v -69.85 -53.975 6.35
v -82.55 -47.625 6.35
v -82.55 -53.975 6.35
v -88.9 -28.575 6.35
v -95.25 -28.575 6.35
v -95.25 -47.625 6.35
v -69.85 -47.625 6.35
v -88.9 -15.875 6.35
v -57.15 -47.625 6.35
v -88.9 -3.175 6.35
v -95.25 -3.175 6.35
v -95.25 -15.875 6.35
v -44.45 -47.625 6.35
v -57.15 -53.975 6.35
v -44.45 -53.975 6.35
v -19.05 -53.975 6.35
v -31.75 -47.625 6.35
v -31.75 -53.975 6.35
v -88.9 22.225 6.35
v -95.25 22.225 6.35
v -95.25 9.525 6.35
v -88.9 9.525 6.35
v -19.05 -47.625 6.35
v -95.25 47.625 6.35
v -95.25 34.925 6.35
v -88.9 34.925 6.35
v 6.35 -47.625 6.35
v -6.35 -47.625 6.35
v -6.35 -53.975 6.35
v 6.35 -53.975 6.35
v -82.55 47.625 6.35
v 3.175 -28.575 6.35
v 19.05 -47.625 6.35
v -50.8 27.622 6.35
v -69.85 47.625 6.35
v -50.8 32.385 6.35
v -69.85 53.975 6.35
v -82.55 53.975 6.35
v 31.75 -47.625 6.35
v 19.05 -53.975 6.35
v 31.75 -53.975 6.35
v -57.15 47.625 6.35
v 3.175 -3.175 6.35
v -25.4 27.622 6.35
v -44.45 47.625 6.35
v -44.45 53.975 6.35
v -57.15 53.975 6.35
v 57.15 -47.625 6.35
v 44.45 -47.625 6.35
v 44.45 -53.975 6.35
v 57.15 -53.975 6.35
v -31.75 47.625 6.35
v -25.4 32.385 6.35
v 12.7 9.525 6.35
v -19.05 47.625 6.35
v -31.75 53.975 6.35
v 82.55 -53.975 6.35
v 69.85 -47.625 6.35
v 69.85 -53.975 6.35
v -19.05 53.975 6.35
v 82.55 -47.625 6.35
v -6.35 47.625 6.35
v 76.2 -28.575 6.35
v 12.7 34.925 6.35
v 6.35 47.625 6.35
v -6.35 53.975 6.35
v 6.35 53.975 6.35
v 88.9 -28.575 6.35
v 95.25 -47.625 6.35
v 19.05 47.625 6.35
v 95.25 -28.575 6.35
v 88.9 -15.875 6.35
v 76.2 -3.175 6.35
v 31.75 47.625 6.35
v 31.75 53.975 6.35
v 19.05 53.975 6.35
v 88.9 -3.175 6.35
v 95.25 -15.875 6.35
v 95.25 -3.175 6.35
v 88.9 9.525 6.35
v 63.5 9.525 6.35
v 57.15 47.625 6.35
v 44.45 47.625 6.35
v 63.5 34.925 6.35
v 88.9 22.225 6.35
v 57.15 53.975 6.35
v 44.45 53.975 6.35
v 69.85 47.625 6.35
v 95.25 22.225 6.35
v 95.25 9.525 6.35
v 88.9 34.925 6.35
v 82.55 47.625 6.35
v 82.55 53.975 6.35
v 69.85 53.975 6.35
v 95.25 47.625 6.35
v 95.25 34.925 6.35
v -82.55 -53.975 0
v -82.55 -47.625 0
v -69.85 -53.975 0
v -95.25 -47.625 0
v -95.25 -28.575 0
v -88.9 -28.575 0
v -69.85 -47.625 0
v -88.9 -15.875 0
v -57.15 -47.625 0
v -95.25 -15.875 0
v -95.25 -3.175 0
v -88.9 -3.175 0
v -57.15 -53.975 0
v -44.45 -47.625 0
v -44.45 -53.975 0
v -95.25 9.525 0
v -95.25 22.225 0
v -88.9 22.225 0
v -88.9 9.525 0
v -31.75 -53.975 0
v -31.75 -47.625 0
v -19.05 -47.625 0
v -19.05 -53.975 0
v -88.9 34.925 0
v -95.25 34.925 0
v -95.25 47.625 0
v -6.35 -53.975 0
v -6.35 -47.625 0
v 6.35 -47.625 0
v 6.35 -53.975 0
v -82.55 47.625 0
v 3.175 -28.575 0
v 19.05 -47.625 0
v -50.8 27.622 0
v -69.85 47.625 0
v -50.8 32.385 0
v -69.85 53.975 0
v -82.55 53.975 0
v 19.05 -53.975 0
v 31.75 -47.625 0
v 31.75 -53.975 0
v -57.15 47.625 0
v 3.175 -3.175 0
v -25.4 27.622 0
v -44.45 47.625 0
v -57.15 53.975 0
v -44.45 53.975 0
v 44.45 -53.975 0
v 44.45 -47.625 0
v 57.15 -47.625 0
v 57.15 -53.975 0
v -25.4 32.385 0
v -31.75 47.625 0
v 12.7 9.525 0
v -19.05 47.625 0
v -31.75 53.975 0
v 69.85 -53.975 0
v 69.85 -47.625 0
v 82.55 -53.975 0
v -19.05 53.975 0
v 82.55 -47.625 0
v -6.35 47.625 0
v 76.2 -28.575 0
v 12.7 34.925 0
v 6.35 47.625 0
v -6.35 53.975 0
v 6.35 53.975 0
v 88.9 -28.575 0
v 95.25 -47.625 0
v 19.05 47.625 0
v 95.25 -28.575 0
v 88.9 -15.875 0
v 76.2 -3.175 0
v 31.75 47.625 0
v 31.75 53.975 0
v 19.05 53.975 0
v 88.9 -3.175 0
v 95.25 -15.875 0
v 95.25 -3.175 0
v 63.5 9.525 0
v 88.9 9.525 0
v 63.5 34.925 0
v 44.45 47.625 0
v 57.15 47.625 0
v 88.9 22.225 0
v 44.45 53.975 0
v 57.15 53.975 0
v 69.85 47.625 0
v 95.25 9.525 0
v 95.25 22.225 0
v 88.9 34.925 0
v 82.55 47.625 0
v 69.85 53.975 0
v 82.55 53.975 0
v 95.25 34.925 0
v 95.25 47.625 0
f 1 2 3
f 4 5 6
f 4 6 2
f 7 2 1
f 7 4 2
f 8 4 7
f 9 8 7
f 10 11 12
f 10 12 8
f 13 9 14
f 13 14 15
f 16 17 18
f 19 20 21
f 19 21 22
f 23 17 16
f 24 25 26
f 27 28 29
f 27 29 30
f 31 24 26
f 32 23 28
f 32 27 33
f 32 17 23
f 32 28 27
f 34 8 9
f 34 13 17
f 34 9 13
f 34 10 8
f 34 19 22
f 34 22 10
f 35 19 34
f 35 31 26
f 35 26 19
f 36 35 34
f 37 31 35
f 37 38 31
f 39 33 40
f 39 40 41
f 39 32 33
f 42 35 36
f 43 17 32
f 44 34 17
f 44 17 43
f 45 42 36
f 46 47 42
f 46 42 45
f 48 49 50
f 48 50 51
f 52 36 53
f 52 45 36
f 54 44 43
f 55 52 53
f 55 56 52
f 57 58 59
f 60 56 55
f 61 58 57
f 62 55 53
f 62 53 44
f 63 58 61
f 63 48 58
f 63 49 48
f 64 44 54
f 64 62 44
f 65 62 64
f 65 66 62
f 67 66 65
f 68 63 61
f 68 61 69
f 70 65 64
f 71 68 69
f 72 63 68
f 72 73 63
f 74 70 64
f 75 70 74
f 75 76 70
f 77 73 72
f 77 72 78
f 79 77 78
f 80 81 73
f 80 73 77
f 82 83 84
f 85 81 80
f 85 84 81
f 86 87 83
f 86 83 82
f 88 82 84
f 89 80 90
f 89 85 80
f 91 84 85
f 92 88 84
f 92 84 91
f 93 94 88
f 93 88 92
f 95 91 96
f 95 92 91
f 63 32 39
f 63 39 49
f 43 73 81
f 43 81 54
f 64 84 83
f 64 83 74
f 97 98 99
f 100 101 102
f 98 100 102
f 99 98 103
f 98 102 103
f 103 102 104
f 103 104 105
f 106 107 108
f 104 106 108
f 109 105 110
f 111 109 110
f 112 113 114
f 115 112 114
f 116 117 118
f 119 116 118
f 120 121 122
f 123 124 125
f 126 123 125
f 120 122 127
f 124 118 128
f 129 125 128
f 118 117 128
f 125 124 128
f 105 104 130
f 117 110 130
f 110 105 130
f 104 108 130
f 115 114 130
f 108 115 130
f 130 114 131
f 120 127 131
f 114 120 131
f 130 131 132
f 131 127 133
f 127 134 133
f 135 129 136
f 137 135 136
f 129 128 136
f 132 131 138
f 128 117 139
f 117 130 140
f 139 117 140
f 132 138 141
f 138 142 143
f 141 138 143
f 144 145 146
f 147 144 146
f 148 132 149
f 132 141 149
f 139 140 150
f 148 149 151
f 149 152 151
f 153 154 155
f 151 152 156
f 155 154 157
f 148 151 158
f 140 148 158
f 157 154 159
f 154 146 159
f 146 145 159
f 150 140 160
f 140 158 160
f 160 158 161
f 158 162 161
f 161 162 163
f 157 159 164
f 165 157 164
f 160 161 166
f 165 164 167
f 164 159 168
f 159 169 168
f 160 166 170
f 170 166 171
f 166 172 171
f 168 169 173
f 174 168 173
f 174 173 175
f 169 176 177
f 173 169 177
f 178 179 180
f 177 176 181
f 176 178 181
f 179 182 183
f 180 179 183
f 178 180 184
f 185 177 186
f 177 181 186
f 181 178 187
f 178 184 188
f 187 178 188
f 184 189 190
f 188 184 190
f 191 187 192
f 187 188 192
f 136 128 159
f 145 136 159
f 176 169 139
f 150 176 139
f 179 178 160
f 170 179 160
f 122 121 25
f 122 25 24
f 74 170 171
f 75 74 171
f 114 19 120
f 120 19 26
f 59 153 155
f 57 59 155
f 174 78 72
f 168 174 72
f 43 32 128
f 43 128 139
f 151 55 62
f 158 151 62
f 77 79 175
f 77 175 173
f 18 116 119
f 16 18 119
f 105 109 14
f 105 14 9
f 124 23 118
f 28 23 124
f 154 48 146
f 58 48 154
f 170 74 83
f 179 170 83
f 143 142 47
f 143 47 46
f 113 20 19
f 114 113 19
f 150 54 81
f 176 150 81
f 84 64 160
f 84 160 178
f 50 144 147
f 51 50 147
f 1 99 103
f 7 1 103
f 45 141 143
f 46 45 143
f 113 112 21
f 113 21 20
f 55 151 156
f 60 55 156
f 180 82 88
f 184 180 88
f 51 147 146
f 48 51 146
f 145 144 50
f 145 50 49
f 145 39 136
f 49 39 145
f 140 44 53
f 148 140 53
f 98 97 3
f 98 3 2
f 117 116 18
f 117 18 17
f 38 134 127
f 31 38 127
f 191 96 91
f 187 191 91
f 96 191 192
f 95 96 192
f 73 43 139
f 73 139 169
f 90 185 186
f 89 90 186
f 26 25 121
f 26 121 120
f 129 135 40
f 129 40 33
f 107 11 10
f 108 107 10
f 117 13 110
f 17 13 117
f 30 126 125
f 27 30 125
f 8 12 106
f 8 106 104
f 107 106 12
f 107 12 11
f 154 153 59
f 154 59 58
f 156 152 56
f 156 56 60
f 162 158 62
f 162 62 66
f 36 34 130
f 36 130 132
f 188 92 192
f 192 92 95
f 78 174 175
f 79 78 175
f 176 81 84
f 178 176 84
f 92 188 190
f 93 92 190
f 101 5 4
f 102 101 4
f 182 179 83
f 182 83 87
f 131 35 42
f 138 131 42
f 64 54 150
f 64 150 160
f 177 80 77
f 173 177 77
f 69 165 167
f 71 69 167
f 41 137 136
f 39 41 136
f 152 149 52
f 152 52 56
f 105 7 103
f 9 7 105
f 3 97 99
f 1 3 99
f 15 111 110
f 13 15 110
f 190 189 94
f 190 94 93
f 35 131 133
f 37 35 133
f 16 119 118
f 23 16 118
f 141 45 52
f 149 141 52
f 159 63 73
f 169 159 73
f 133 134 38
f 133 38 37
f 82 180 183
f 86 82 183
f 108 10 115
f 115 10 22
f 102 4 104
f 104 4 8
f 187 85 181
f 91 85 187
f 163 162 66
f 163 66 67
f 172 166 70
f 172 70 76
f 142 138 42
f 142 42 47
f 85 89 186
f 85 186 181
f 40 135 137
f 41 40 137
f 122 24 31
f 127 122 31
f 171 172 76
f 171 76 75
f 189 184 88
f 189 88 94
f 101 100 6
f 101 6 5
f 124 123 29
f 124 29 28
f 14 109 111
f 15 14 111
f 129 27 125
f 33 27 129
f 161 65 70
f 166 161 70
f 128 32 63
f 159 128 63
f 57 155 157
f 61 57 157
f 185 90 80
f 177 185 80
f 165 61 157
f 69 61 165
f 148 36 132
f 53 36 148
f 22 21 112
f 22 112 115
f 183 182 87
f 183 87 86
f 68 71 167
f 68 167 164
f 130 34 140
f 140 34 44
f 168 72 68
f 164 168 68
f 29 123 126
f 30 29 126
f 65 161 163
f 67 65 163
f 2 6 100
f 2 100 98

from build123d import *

# Parameters (mm, degrees)
SKETCH1_W               = 190.5
SKETCH1_H               = 107.95
BOSS_EXTRUDE1_DEPTH     = 6.35
SKETCH2_W               = 12.7
SKETCH2_H               = 6.35
CUT_EXTRUDE1_DEPTH      = 7.35
LPATTERN1_COUNT         = 8
LPATTERN1_PITCH         = 25.4
MIRROR1_COPY_1_SKETCH_W = 12.7
MIRROR1_COPY_1_SKETCH_H = 6.35
MIRROR1_COPY_1_DEPTH    = 7.35
MIRROR1_COPY_2_SKETCH_W = 12.7
MIRROR1_COPY_2_SKETCH_H = 6.35
MIRROR1_COPY_2_DEPTH    = 7.35
MIRROR1_COPY_3_SKETCH_W = 12.7
MIRROR1_COPY_3_SKETCH_H = 6.35
MIRROR1_COPY_3_DEPTH    = 7.35
MIRROR1_COPY_4_SKETCH_W = 12.7
MIRROR1_COPY_4_SKETCH_H = 6.35
MIRROR1_COPY_4_DEPTH    = 7.35
MIRROR1_COPY_5_SKETCH_W = 12.7
MIRROR1_COPY_5_SKETCH_H = 6.35
MIRROR1_COPY_5_DEPTH    = 7.35
MIRROR1_COPY_6_SKETCH_W = 12.7
MIRROR1_COPY_6_SKETCH_H = 6.35
MIRROR1_COPY_6_DEPTH    = 7.35
MIRROR1_COPY_7_SKETCH_W = 12.7
MIRROR1_COPY_7_SKETCH_H = 6.35
MIRROR1_COPY_7_DEPTH    = 7.35
SKETCH3_W               = 6.35
SKETCH3_H               = 12.7
CUT_EXTRUDE2_DEPTH      = 7.35
LPATTERN2_COUNT         = 3
LPATTERN2_PITCH         = 25.4
MIRROR2_COPY_1_SKETCH_W = 6.35
MIRROR2_COPY_1_SKETCH_H = 12.7
MIRROR2_COPY_1_DEPTH    = 7.35
MIRROR2_COPY_2_SKETCH_W = 6.35
MIRROR2_COPY_2_SKETCH_H = 12.7
MIRROR2_COPY_2_DEPTH    = 7.35
SKETCH4_W               = 25.4
SKETCH4_H               = 4.7625
CUT_EXTRUDE3_DEPTH      = 7.35
SKETCH5_W               = 73.025
SKETCH5_H               = 25.4
CUT_EXTRUDE4_DEPTH      = 7.35
SKETCH6_W               = 50.8
SKETCH6_H               = 25.4
CUT_EXTRUDE5_DEPTH      = 7.35


with BuildPart() as part:
    # Sketch1 → Boss-Extrude1 (new body)
    with BuildSketch(Plane.XY):
        Rectangle(SKETCH1_W, SKETCH1_H)
    extrude(amount=BOSS_EXTRUDE1_DEPTH)

    # Sketch2 → Cut-Extrude1 (cut, through all)
    with BuildSketch(Plane.XY.offset(6.35)):
        with Locations((-88.9, -50.8)):
            Rectangle(SKETCH2_W, SKETCH2_H)
    cut_extrude1 = extrude(amount=-CUT_EXTRUDE1_DEPTH, mode=Mode.SUBTRACT)

    # LPattern1: Cut-Extrude1 ×8
    with Locations(*[(i * LPATTERN1_PITCH, 0, 0) for i in range(1, LPATTERN1_COUNT)]):
        add(cut_extrude1, mode=Mode.SUBTRACT)

    # Mirror1: Cut-Extrude1 across plane
    add(cut_extrude1.mirror(Plane.ZX), mode=Mode.SUBTRACT)

    # Mirror1 copy 1 sketch → Mirror1 copy 1 (cut, through all)
    with BuildSketch(Plane(origin=(25.4, 0, 6.35), x_dir=(1, 0, 0), z_dir=(0, 0, 1))):
        with Locations((-88.9, 50.8)):
            Rectangle(MIRROR1_COPY_1_SKETCH_W, MIRROR1_COPY_1_SKETCH_H)
    extrude(amount=-MIRROR1_COPY_1_DEPTH, mode=Mode.SUBTRACT)

    # Mirror1 copy 2 sketch → Mirror1 copy 2 (cut, through all)
    with BuildSketch(Plane(origin=(50.8, 0, 6.35), x_dir=(1, 0, 0), z_dir=(0, 0, 1))):
        with Locations((-88.9, 50.8)):
            Rectangle(MIRROR1_COPY_2_SKETCH_W, MIRROR1_COPY_2_SKETCH_H)
    extrude(amount=-MIRROR1_COPY_2_DEPTH, mode=Mode.SUBTRACT)

    # Mirror1 copy 3 sketch → Mirror1 copy 3 (cut, through all)
    with BuildSketch(Plane(origin=(76.2, 0, 6.35), x_dir=(1, 0, 0), z_dir=(0, 0, 1))):
        with Locations((-88.9, 50.8)):
            Rectangle(MIRROR1_COPY_3_SKETCH_W, MIRROR1_COPY_3_SKETCH_H)
    extrude(amount=-MIRROR1_COPY_3_DEPTH, mode=Mode.SUBTRACT)

    # Mirror1 copy 4 sketch → Mirror1 copy 4 (cut, through all)
    with BuildSketch(Plane(origin=(101.6, 0, 6.35), x_dir=(1, 0, 0), z_dir=(0, 0, 1))):
        with Locations((-88.9, 50.8)):
            Rectangle(MIRROR1_COPY_4_SKETCH_W, MIRROR1_COPY_4_SKETCH_H)
    extrude(amount=-MIRROR1_COPY_4_DEPTH, mode=Mode.SUBTRACT)

    # Mirror1 copy 5 sketch → Mirror1 copy 5 (cut, through all)
    with BuildSketch(Plane(origin=(127, 0, 6.35), x_dir=(1, 0, 0), z_dir=(0, 0, 1))):
        with Locations((-88.9, 50.8)):
            Rectangle(MIRROR1_COPY_5_SKETCH_W, MIRROR1_COPY_5_SKETCH_H)
    extrude(amount=-MIRROR1_COPY_5_DEPTH, mode=Mode.SUBTRACT)

    # Mirror1 copy 6 sketch → Mirror1 copy 6 (cut, through all)
    with BuildSketch(Plane(origin=(152.4, 0, 6.35), x_dir=(1, 0, 0), z_dir=(0, 0, 1))):
        with Locations((-88.9, 50.8)):
            Rectangle(MIRROR1_COPY_6_SKETCH_W, MIRROR1_COPY_6_SKETCH_H)
    extrude(amount=-MIRROR1_COPY_6_DEPTH, mode=Mode.SUBTRACT)

    # Mirror1 copy 7 sketch → Mirror1 copy 7 (cut, through all)
    with BuildSketch(Plane(origin=(177.8, 0, 6.35), x_dir=(1, 0, 0), z_dir=(0, 0, 1))):
        with Locations((-88.9, 50.8)):
            Rectangle(MIRROR1_COPY_7_SKETCH_W, MIRROR1_COPY_7_SKETCH_H)
    extrude(amount=-MIRROR1_COPY_7_DEPTH, mode=Mode.SUBTRACT)

    # Sketch3 → Cut-Extrude2 (cut, through all)
    with BuildSketch(Plane.XY.offset(6.35)):
        with Locations((-92.075, 28.575)):
            Rectangle(SKETCH3_W, SKETCH3_H)
    cut_extrude2 = extrude(amount=-CUT_EXTRUDE2_DEPTH, mode=Mode.SUBTRACT)

    # LPattern2: Cut-Extrude2 ×3
    with Locations(*[(0, -i * LPATTERN2_PITCH, 0) for i in range(1, LPATTERN2_COUNT)]):
        add(cut_extrude2, mode=Mode.SUBTRACT)

    # Mirror2: Cut-Extrude2 across plane
    add(cut_extrude2.mirror(Plane(origin=(0, 0, 0), x_dir=(0, 0, 1), z_dir=(1, 0, 0))), mode=Mode.SUBTRACT)

    # Mirror2 copy 1 sketch → Mirror2 copy 1 (cut, through all)
    with BuildSketch(Plane(origin=(0, -25.4, 6.35), x_dir=(-1, 0, 0), z_dir=(0, 0, 1))):
        with Locations((-92.075, -28.575)):
            Rectangle(MIRROR2_COPY_1_SKETCH_W, MIRROR2_COPY_1_SKETCH_H)
    extrude(amount=-MIRROR2_COPY_1_DEPTH, mode=Mode.SUBTRACT)

    # Mirror2 copy 2 sketch → Mirror2 copy 2 (cut, through all)
    with BuildSketch(Plane(origin=(0, -50.8, 6.35), x_dir=(-1, 0, 0), z_dir=(0, 0, 1))):
        with Locations((-92.075, -28.575)):
            Rectangle(MIRROR2_COPY_2_SKETCH_W, MIRROR2_COPY_2_SKETCH_H)
    extrude(amount=-MIRROR2_COPY_2_DEPTH, mode=Mode.SUBTRACT)

    # Sketch4 → Cut-Extrude3 (cut, through all)
    with BuildSketch(Plane.XY.offset(6.35)):
        with Locations((-38.1, 30.00375)):
            Rectangle(SKETCH4_W, SKETCH4_H)
    extrude(amount=-CUT_EXTRUDE3_DEPTH, mode=Mode.SUBTRACT)

    # Sketch5 → Cut-Extrude4 (cut, through all)
    with BuildSketch(Plane.XY.offset(6.35)):
        with Locations((39.6875, -15.875)):
            Rectangle(SKETCH5_W, SKETCH5_H)
    extrude(amount=-CUT_EXTRUDE4_DEPTH, mode=Mode.SUBTRACT)

    # Sketch6 → Cut-Extrude5 (cut, through all)
    with BuildSketch(Plane.XY.offset(6.35)):
        with Locations((38.1, 22.225)):
            Rectangle(SKETCH6_W, SKETCH6_H)
    extrude(amount=-CUT_EXTRUDE5_DEPTH, mode=Mode.SUBTRACT)


solid = part.part
